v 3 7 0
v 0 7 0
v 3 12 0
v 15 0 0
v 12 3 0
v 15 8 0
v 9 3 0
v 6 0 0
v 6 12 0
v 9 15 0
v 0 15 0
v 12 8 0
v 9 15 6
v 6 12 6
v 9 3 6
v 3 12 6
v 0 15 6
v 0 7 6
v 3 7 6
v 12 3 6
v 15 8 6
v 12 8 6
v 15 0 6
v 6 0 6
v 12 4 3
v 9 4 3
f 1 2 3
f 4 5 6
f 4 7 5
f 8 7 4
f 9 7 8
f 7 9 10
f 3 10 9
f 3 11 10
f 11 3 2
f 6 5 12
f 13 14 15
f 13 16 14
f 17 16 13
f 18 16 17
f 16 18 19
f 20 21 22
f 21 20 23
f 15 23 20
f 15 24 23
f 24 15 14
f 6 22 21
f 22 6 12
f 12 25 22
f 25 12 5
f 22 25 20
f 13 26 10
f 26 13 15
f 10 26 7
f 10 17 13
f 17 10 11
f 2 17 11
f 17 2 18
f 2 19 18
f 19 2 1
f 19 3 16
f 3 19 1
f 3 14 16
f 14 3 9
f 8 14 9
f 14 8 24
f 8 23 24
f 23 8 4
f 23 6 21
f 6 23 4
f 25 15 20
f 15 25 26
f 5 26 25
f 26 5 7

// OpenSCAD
thin=3;
hook=8;

union() {

linear_extrude(height=thin*2)
polygon(points=[[0,thin*5-hook], [0,thin*5], [thin*3,thin*5],
			[thin*3,thin], [thin*4,thin], [thin*4,hook],
			[thin*5,hook], [thin*5,0], [thin*2,0],
			[thin*2,thin*4], [thin,thin*4], [thin,thin*5-hook]]);

translate([thin*4,thin,0])
rotate([0,-90])
linear_extrude(height=thin)
polygon(points=[[0,0], [thin,1],
			[thin*2,0]]);

}
